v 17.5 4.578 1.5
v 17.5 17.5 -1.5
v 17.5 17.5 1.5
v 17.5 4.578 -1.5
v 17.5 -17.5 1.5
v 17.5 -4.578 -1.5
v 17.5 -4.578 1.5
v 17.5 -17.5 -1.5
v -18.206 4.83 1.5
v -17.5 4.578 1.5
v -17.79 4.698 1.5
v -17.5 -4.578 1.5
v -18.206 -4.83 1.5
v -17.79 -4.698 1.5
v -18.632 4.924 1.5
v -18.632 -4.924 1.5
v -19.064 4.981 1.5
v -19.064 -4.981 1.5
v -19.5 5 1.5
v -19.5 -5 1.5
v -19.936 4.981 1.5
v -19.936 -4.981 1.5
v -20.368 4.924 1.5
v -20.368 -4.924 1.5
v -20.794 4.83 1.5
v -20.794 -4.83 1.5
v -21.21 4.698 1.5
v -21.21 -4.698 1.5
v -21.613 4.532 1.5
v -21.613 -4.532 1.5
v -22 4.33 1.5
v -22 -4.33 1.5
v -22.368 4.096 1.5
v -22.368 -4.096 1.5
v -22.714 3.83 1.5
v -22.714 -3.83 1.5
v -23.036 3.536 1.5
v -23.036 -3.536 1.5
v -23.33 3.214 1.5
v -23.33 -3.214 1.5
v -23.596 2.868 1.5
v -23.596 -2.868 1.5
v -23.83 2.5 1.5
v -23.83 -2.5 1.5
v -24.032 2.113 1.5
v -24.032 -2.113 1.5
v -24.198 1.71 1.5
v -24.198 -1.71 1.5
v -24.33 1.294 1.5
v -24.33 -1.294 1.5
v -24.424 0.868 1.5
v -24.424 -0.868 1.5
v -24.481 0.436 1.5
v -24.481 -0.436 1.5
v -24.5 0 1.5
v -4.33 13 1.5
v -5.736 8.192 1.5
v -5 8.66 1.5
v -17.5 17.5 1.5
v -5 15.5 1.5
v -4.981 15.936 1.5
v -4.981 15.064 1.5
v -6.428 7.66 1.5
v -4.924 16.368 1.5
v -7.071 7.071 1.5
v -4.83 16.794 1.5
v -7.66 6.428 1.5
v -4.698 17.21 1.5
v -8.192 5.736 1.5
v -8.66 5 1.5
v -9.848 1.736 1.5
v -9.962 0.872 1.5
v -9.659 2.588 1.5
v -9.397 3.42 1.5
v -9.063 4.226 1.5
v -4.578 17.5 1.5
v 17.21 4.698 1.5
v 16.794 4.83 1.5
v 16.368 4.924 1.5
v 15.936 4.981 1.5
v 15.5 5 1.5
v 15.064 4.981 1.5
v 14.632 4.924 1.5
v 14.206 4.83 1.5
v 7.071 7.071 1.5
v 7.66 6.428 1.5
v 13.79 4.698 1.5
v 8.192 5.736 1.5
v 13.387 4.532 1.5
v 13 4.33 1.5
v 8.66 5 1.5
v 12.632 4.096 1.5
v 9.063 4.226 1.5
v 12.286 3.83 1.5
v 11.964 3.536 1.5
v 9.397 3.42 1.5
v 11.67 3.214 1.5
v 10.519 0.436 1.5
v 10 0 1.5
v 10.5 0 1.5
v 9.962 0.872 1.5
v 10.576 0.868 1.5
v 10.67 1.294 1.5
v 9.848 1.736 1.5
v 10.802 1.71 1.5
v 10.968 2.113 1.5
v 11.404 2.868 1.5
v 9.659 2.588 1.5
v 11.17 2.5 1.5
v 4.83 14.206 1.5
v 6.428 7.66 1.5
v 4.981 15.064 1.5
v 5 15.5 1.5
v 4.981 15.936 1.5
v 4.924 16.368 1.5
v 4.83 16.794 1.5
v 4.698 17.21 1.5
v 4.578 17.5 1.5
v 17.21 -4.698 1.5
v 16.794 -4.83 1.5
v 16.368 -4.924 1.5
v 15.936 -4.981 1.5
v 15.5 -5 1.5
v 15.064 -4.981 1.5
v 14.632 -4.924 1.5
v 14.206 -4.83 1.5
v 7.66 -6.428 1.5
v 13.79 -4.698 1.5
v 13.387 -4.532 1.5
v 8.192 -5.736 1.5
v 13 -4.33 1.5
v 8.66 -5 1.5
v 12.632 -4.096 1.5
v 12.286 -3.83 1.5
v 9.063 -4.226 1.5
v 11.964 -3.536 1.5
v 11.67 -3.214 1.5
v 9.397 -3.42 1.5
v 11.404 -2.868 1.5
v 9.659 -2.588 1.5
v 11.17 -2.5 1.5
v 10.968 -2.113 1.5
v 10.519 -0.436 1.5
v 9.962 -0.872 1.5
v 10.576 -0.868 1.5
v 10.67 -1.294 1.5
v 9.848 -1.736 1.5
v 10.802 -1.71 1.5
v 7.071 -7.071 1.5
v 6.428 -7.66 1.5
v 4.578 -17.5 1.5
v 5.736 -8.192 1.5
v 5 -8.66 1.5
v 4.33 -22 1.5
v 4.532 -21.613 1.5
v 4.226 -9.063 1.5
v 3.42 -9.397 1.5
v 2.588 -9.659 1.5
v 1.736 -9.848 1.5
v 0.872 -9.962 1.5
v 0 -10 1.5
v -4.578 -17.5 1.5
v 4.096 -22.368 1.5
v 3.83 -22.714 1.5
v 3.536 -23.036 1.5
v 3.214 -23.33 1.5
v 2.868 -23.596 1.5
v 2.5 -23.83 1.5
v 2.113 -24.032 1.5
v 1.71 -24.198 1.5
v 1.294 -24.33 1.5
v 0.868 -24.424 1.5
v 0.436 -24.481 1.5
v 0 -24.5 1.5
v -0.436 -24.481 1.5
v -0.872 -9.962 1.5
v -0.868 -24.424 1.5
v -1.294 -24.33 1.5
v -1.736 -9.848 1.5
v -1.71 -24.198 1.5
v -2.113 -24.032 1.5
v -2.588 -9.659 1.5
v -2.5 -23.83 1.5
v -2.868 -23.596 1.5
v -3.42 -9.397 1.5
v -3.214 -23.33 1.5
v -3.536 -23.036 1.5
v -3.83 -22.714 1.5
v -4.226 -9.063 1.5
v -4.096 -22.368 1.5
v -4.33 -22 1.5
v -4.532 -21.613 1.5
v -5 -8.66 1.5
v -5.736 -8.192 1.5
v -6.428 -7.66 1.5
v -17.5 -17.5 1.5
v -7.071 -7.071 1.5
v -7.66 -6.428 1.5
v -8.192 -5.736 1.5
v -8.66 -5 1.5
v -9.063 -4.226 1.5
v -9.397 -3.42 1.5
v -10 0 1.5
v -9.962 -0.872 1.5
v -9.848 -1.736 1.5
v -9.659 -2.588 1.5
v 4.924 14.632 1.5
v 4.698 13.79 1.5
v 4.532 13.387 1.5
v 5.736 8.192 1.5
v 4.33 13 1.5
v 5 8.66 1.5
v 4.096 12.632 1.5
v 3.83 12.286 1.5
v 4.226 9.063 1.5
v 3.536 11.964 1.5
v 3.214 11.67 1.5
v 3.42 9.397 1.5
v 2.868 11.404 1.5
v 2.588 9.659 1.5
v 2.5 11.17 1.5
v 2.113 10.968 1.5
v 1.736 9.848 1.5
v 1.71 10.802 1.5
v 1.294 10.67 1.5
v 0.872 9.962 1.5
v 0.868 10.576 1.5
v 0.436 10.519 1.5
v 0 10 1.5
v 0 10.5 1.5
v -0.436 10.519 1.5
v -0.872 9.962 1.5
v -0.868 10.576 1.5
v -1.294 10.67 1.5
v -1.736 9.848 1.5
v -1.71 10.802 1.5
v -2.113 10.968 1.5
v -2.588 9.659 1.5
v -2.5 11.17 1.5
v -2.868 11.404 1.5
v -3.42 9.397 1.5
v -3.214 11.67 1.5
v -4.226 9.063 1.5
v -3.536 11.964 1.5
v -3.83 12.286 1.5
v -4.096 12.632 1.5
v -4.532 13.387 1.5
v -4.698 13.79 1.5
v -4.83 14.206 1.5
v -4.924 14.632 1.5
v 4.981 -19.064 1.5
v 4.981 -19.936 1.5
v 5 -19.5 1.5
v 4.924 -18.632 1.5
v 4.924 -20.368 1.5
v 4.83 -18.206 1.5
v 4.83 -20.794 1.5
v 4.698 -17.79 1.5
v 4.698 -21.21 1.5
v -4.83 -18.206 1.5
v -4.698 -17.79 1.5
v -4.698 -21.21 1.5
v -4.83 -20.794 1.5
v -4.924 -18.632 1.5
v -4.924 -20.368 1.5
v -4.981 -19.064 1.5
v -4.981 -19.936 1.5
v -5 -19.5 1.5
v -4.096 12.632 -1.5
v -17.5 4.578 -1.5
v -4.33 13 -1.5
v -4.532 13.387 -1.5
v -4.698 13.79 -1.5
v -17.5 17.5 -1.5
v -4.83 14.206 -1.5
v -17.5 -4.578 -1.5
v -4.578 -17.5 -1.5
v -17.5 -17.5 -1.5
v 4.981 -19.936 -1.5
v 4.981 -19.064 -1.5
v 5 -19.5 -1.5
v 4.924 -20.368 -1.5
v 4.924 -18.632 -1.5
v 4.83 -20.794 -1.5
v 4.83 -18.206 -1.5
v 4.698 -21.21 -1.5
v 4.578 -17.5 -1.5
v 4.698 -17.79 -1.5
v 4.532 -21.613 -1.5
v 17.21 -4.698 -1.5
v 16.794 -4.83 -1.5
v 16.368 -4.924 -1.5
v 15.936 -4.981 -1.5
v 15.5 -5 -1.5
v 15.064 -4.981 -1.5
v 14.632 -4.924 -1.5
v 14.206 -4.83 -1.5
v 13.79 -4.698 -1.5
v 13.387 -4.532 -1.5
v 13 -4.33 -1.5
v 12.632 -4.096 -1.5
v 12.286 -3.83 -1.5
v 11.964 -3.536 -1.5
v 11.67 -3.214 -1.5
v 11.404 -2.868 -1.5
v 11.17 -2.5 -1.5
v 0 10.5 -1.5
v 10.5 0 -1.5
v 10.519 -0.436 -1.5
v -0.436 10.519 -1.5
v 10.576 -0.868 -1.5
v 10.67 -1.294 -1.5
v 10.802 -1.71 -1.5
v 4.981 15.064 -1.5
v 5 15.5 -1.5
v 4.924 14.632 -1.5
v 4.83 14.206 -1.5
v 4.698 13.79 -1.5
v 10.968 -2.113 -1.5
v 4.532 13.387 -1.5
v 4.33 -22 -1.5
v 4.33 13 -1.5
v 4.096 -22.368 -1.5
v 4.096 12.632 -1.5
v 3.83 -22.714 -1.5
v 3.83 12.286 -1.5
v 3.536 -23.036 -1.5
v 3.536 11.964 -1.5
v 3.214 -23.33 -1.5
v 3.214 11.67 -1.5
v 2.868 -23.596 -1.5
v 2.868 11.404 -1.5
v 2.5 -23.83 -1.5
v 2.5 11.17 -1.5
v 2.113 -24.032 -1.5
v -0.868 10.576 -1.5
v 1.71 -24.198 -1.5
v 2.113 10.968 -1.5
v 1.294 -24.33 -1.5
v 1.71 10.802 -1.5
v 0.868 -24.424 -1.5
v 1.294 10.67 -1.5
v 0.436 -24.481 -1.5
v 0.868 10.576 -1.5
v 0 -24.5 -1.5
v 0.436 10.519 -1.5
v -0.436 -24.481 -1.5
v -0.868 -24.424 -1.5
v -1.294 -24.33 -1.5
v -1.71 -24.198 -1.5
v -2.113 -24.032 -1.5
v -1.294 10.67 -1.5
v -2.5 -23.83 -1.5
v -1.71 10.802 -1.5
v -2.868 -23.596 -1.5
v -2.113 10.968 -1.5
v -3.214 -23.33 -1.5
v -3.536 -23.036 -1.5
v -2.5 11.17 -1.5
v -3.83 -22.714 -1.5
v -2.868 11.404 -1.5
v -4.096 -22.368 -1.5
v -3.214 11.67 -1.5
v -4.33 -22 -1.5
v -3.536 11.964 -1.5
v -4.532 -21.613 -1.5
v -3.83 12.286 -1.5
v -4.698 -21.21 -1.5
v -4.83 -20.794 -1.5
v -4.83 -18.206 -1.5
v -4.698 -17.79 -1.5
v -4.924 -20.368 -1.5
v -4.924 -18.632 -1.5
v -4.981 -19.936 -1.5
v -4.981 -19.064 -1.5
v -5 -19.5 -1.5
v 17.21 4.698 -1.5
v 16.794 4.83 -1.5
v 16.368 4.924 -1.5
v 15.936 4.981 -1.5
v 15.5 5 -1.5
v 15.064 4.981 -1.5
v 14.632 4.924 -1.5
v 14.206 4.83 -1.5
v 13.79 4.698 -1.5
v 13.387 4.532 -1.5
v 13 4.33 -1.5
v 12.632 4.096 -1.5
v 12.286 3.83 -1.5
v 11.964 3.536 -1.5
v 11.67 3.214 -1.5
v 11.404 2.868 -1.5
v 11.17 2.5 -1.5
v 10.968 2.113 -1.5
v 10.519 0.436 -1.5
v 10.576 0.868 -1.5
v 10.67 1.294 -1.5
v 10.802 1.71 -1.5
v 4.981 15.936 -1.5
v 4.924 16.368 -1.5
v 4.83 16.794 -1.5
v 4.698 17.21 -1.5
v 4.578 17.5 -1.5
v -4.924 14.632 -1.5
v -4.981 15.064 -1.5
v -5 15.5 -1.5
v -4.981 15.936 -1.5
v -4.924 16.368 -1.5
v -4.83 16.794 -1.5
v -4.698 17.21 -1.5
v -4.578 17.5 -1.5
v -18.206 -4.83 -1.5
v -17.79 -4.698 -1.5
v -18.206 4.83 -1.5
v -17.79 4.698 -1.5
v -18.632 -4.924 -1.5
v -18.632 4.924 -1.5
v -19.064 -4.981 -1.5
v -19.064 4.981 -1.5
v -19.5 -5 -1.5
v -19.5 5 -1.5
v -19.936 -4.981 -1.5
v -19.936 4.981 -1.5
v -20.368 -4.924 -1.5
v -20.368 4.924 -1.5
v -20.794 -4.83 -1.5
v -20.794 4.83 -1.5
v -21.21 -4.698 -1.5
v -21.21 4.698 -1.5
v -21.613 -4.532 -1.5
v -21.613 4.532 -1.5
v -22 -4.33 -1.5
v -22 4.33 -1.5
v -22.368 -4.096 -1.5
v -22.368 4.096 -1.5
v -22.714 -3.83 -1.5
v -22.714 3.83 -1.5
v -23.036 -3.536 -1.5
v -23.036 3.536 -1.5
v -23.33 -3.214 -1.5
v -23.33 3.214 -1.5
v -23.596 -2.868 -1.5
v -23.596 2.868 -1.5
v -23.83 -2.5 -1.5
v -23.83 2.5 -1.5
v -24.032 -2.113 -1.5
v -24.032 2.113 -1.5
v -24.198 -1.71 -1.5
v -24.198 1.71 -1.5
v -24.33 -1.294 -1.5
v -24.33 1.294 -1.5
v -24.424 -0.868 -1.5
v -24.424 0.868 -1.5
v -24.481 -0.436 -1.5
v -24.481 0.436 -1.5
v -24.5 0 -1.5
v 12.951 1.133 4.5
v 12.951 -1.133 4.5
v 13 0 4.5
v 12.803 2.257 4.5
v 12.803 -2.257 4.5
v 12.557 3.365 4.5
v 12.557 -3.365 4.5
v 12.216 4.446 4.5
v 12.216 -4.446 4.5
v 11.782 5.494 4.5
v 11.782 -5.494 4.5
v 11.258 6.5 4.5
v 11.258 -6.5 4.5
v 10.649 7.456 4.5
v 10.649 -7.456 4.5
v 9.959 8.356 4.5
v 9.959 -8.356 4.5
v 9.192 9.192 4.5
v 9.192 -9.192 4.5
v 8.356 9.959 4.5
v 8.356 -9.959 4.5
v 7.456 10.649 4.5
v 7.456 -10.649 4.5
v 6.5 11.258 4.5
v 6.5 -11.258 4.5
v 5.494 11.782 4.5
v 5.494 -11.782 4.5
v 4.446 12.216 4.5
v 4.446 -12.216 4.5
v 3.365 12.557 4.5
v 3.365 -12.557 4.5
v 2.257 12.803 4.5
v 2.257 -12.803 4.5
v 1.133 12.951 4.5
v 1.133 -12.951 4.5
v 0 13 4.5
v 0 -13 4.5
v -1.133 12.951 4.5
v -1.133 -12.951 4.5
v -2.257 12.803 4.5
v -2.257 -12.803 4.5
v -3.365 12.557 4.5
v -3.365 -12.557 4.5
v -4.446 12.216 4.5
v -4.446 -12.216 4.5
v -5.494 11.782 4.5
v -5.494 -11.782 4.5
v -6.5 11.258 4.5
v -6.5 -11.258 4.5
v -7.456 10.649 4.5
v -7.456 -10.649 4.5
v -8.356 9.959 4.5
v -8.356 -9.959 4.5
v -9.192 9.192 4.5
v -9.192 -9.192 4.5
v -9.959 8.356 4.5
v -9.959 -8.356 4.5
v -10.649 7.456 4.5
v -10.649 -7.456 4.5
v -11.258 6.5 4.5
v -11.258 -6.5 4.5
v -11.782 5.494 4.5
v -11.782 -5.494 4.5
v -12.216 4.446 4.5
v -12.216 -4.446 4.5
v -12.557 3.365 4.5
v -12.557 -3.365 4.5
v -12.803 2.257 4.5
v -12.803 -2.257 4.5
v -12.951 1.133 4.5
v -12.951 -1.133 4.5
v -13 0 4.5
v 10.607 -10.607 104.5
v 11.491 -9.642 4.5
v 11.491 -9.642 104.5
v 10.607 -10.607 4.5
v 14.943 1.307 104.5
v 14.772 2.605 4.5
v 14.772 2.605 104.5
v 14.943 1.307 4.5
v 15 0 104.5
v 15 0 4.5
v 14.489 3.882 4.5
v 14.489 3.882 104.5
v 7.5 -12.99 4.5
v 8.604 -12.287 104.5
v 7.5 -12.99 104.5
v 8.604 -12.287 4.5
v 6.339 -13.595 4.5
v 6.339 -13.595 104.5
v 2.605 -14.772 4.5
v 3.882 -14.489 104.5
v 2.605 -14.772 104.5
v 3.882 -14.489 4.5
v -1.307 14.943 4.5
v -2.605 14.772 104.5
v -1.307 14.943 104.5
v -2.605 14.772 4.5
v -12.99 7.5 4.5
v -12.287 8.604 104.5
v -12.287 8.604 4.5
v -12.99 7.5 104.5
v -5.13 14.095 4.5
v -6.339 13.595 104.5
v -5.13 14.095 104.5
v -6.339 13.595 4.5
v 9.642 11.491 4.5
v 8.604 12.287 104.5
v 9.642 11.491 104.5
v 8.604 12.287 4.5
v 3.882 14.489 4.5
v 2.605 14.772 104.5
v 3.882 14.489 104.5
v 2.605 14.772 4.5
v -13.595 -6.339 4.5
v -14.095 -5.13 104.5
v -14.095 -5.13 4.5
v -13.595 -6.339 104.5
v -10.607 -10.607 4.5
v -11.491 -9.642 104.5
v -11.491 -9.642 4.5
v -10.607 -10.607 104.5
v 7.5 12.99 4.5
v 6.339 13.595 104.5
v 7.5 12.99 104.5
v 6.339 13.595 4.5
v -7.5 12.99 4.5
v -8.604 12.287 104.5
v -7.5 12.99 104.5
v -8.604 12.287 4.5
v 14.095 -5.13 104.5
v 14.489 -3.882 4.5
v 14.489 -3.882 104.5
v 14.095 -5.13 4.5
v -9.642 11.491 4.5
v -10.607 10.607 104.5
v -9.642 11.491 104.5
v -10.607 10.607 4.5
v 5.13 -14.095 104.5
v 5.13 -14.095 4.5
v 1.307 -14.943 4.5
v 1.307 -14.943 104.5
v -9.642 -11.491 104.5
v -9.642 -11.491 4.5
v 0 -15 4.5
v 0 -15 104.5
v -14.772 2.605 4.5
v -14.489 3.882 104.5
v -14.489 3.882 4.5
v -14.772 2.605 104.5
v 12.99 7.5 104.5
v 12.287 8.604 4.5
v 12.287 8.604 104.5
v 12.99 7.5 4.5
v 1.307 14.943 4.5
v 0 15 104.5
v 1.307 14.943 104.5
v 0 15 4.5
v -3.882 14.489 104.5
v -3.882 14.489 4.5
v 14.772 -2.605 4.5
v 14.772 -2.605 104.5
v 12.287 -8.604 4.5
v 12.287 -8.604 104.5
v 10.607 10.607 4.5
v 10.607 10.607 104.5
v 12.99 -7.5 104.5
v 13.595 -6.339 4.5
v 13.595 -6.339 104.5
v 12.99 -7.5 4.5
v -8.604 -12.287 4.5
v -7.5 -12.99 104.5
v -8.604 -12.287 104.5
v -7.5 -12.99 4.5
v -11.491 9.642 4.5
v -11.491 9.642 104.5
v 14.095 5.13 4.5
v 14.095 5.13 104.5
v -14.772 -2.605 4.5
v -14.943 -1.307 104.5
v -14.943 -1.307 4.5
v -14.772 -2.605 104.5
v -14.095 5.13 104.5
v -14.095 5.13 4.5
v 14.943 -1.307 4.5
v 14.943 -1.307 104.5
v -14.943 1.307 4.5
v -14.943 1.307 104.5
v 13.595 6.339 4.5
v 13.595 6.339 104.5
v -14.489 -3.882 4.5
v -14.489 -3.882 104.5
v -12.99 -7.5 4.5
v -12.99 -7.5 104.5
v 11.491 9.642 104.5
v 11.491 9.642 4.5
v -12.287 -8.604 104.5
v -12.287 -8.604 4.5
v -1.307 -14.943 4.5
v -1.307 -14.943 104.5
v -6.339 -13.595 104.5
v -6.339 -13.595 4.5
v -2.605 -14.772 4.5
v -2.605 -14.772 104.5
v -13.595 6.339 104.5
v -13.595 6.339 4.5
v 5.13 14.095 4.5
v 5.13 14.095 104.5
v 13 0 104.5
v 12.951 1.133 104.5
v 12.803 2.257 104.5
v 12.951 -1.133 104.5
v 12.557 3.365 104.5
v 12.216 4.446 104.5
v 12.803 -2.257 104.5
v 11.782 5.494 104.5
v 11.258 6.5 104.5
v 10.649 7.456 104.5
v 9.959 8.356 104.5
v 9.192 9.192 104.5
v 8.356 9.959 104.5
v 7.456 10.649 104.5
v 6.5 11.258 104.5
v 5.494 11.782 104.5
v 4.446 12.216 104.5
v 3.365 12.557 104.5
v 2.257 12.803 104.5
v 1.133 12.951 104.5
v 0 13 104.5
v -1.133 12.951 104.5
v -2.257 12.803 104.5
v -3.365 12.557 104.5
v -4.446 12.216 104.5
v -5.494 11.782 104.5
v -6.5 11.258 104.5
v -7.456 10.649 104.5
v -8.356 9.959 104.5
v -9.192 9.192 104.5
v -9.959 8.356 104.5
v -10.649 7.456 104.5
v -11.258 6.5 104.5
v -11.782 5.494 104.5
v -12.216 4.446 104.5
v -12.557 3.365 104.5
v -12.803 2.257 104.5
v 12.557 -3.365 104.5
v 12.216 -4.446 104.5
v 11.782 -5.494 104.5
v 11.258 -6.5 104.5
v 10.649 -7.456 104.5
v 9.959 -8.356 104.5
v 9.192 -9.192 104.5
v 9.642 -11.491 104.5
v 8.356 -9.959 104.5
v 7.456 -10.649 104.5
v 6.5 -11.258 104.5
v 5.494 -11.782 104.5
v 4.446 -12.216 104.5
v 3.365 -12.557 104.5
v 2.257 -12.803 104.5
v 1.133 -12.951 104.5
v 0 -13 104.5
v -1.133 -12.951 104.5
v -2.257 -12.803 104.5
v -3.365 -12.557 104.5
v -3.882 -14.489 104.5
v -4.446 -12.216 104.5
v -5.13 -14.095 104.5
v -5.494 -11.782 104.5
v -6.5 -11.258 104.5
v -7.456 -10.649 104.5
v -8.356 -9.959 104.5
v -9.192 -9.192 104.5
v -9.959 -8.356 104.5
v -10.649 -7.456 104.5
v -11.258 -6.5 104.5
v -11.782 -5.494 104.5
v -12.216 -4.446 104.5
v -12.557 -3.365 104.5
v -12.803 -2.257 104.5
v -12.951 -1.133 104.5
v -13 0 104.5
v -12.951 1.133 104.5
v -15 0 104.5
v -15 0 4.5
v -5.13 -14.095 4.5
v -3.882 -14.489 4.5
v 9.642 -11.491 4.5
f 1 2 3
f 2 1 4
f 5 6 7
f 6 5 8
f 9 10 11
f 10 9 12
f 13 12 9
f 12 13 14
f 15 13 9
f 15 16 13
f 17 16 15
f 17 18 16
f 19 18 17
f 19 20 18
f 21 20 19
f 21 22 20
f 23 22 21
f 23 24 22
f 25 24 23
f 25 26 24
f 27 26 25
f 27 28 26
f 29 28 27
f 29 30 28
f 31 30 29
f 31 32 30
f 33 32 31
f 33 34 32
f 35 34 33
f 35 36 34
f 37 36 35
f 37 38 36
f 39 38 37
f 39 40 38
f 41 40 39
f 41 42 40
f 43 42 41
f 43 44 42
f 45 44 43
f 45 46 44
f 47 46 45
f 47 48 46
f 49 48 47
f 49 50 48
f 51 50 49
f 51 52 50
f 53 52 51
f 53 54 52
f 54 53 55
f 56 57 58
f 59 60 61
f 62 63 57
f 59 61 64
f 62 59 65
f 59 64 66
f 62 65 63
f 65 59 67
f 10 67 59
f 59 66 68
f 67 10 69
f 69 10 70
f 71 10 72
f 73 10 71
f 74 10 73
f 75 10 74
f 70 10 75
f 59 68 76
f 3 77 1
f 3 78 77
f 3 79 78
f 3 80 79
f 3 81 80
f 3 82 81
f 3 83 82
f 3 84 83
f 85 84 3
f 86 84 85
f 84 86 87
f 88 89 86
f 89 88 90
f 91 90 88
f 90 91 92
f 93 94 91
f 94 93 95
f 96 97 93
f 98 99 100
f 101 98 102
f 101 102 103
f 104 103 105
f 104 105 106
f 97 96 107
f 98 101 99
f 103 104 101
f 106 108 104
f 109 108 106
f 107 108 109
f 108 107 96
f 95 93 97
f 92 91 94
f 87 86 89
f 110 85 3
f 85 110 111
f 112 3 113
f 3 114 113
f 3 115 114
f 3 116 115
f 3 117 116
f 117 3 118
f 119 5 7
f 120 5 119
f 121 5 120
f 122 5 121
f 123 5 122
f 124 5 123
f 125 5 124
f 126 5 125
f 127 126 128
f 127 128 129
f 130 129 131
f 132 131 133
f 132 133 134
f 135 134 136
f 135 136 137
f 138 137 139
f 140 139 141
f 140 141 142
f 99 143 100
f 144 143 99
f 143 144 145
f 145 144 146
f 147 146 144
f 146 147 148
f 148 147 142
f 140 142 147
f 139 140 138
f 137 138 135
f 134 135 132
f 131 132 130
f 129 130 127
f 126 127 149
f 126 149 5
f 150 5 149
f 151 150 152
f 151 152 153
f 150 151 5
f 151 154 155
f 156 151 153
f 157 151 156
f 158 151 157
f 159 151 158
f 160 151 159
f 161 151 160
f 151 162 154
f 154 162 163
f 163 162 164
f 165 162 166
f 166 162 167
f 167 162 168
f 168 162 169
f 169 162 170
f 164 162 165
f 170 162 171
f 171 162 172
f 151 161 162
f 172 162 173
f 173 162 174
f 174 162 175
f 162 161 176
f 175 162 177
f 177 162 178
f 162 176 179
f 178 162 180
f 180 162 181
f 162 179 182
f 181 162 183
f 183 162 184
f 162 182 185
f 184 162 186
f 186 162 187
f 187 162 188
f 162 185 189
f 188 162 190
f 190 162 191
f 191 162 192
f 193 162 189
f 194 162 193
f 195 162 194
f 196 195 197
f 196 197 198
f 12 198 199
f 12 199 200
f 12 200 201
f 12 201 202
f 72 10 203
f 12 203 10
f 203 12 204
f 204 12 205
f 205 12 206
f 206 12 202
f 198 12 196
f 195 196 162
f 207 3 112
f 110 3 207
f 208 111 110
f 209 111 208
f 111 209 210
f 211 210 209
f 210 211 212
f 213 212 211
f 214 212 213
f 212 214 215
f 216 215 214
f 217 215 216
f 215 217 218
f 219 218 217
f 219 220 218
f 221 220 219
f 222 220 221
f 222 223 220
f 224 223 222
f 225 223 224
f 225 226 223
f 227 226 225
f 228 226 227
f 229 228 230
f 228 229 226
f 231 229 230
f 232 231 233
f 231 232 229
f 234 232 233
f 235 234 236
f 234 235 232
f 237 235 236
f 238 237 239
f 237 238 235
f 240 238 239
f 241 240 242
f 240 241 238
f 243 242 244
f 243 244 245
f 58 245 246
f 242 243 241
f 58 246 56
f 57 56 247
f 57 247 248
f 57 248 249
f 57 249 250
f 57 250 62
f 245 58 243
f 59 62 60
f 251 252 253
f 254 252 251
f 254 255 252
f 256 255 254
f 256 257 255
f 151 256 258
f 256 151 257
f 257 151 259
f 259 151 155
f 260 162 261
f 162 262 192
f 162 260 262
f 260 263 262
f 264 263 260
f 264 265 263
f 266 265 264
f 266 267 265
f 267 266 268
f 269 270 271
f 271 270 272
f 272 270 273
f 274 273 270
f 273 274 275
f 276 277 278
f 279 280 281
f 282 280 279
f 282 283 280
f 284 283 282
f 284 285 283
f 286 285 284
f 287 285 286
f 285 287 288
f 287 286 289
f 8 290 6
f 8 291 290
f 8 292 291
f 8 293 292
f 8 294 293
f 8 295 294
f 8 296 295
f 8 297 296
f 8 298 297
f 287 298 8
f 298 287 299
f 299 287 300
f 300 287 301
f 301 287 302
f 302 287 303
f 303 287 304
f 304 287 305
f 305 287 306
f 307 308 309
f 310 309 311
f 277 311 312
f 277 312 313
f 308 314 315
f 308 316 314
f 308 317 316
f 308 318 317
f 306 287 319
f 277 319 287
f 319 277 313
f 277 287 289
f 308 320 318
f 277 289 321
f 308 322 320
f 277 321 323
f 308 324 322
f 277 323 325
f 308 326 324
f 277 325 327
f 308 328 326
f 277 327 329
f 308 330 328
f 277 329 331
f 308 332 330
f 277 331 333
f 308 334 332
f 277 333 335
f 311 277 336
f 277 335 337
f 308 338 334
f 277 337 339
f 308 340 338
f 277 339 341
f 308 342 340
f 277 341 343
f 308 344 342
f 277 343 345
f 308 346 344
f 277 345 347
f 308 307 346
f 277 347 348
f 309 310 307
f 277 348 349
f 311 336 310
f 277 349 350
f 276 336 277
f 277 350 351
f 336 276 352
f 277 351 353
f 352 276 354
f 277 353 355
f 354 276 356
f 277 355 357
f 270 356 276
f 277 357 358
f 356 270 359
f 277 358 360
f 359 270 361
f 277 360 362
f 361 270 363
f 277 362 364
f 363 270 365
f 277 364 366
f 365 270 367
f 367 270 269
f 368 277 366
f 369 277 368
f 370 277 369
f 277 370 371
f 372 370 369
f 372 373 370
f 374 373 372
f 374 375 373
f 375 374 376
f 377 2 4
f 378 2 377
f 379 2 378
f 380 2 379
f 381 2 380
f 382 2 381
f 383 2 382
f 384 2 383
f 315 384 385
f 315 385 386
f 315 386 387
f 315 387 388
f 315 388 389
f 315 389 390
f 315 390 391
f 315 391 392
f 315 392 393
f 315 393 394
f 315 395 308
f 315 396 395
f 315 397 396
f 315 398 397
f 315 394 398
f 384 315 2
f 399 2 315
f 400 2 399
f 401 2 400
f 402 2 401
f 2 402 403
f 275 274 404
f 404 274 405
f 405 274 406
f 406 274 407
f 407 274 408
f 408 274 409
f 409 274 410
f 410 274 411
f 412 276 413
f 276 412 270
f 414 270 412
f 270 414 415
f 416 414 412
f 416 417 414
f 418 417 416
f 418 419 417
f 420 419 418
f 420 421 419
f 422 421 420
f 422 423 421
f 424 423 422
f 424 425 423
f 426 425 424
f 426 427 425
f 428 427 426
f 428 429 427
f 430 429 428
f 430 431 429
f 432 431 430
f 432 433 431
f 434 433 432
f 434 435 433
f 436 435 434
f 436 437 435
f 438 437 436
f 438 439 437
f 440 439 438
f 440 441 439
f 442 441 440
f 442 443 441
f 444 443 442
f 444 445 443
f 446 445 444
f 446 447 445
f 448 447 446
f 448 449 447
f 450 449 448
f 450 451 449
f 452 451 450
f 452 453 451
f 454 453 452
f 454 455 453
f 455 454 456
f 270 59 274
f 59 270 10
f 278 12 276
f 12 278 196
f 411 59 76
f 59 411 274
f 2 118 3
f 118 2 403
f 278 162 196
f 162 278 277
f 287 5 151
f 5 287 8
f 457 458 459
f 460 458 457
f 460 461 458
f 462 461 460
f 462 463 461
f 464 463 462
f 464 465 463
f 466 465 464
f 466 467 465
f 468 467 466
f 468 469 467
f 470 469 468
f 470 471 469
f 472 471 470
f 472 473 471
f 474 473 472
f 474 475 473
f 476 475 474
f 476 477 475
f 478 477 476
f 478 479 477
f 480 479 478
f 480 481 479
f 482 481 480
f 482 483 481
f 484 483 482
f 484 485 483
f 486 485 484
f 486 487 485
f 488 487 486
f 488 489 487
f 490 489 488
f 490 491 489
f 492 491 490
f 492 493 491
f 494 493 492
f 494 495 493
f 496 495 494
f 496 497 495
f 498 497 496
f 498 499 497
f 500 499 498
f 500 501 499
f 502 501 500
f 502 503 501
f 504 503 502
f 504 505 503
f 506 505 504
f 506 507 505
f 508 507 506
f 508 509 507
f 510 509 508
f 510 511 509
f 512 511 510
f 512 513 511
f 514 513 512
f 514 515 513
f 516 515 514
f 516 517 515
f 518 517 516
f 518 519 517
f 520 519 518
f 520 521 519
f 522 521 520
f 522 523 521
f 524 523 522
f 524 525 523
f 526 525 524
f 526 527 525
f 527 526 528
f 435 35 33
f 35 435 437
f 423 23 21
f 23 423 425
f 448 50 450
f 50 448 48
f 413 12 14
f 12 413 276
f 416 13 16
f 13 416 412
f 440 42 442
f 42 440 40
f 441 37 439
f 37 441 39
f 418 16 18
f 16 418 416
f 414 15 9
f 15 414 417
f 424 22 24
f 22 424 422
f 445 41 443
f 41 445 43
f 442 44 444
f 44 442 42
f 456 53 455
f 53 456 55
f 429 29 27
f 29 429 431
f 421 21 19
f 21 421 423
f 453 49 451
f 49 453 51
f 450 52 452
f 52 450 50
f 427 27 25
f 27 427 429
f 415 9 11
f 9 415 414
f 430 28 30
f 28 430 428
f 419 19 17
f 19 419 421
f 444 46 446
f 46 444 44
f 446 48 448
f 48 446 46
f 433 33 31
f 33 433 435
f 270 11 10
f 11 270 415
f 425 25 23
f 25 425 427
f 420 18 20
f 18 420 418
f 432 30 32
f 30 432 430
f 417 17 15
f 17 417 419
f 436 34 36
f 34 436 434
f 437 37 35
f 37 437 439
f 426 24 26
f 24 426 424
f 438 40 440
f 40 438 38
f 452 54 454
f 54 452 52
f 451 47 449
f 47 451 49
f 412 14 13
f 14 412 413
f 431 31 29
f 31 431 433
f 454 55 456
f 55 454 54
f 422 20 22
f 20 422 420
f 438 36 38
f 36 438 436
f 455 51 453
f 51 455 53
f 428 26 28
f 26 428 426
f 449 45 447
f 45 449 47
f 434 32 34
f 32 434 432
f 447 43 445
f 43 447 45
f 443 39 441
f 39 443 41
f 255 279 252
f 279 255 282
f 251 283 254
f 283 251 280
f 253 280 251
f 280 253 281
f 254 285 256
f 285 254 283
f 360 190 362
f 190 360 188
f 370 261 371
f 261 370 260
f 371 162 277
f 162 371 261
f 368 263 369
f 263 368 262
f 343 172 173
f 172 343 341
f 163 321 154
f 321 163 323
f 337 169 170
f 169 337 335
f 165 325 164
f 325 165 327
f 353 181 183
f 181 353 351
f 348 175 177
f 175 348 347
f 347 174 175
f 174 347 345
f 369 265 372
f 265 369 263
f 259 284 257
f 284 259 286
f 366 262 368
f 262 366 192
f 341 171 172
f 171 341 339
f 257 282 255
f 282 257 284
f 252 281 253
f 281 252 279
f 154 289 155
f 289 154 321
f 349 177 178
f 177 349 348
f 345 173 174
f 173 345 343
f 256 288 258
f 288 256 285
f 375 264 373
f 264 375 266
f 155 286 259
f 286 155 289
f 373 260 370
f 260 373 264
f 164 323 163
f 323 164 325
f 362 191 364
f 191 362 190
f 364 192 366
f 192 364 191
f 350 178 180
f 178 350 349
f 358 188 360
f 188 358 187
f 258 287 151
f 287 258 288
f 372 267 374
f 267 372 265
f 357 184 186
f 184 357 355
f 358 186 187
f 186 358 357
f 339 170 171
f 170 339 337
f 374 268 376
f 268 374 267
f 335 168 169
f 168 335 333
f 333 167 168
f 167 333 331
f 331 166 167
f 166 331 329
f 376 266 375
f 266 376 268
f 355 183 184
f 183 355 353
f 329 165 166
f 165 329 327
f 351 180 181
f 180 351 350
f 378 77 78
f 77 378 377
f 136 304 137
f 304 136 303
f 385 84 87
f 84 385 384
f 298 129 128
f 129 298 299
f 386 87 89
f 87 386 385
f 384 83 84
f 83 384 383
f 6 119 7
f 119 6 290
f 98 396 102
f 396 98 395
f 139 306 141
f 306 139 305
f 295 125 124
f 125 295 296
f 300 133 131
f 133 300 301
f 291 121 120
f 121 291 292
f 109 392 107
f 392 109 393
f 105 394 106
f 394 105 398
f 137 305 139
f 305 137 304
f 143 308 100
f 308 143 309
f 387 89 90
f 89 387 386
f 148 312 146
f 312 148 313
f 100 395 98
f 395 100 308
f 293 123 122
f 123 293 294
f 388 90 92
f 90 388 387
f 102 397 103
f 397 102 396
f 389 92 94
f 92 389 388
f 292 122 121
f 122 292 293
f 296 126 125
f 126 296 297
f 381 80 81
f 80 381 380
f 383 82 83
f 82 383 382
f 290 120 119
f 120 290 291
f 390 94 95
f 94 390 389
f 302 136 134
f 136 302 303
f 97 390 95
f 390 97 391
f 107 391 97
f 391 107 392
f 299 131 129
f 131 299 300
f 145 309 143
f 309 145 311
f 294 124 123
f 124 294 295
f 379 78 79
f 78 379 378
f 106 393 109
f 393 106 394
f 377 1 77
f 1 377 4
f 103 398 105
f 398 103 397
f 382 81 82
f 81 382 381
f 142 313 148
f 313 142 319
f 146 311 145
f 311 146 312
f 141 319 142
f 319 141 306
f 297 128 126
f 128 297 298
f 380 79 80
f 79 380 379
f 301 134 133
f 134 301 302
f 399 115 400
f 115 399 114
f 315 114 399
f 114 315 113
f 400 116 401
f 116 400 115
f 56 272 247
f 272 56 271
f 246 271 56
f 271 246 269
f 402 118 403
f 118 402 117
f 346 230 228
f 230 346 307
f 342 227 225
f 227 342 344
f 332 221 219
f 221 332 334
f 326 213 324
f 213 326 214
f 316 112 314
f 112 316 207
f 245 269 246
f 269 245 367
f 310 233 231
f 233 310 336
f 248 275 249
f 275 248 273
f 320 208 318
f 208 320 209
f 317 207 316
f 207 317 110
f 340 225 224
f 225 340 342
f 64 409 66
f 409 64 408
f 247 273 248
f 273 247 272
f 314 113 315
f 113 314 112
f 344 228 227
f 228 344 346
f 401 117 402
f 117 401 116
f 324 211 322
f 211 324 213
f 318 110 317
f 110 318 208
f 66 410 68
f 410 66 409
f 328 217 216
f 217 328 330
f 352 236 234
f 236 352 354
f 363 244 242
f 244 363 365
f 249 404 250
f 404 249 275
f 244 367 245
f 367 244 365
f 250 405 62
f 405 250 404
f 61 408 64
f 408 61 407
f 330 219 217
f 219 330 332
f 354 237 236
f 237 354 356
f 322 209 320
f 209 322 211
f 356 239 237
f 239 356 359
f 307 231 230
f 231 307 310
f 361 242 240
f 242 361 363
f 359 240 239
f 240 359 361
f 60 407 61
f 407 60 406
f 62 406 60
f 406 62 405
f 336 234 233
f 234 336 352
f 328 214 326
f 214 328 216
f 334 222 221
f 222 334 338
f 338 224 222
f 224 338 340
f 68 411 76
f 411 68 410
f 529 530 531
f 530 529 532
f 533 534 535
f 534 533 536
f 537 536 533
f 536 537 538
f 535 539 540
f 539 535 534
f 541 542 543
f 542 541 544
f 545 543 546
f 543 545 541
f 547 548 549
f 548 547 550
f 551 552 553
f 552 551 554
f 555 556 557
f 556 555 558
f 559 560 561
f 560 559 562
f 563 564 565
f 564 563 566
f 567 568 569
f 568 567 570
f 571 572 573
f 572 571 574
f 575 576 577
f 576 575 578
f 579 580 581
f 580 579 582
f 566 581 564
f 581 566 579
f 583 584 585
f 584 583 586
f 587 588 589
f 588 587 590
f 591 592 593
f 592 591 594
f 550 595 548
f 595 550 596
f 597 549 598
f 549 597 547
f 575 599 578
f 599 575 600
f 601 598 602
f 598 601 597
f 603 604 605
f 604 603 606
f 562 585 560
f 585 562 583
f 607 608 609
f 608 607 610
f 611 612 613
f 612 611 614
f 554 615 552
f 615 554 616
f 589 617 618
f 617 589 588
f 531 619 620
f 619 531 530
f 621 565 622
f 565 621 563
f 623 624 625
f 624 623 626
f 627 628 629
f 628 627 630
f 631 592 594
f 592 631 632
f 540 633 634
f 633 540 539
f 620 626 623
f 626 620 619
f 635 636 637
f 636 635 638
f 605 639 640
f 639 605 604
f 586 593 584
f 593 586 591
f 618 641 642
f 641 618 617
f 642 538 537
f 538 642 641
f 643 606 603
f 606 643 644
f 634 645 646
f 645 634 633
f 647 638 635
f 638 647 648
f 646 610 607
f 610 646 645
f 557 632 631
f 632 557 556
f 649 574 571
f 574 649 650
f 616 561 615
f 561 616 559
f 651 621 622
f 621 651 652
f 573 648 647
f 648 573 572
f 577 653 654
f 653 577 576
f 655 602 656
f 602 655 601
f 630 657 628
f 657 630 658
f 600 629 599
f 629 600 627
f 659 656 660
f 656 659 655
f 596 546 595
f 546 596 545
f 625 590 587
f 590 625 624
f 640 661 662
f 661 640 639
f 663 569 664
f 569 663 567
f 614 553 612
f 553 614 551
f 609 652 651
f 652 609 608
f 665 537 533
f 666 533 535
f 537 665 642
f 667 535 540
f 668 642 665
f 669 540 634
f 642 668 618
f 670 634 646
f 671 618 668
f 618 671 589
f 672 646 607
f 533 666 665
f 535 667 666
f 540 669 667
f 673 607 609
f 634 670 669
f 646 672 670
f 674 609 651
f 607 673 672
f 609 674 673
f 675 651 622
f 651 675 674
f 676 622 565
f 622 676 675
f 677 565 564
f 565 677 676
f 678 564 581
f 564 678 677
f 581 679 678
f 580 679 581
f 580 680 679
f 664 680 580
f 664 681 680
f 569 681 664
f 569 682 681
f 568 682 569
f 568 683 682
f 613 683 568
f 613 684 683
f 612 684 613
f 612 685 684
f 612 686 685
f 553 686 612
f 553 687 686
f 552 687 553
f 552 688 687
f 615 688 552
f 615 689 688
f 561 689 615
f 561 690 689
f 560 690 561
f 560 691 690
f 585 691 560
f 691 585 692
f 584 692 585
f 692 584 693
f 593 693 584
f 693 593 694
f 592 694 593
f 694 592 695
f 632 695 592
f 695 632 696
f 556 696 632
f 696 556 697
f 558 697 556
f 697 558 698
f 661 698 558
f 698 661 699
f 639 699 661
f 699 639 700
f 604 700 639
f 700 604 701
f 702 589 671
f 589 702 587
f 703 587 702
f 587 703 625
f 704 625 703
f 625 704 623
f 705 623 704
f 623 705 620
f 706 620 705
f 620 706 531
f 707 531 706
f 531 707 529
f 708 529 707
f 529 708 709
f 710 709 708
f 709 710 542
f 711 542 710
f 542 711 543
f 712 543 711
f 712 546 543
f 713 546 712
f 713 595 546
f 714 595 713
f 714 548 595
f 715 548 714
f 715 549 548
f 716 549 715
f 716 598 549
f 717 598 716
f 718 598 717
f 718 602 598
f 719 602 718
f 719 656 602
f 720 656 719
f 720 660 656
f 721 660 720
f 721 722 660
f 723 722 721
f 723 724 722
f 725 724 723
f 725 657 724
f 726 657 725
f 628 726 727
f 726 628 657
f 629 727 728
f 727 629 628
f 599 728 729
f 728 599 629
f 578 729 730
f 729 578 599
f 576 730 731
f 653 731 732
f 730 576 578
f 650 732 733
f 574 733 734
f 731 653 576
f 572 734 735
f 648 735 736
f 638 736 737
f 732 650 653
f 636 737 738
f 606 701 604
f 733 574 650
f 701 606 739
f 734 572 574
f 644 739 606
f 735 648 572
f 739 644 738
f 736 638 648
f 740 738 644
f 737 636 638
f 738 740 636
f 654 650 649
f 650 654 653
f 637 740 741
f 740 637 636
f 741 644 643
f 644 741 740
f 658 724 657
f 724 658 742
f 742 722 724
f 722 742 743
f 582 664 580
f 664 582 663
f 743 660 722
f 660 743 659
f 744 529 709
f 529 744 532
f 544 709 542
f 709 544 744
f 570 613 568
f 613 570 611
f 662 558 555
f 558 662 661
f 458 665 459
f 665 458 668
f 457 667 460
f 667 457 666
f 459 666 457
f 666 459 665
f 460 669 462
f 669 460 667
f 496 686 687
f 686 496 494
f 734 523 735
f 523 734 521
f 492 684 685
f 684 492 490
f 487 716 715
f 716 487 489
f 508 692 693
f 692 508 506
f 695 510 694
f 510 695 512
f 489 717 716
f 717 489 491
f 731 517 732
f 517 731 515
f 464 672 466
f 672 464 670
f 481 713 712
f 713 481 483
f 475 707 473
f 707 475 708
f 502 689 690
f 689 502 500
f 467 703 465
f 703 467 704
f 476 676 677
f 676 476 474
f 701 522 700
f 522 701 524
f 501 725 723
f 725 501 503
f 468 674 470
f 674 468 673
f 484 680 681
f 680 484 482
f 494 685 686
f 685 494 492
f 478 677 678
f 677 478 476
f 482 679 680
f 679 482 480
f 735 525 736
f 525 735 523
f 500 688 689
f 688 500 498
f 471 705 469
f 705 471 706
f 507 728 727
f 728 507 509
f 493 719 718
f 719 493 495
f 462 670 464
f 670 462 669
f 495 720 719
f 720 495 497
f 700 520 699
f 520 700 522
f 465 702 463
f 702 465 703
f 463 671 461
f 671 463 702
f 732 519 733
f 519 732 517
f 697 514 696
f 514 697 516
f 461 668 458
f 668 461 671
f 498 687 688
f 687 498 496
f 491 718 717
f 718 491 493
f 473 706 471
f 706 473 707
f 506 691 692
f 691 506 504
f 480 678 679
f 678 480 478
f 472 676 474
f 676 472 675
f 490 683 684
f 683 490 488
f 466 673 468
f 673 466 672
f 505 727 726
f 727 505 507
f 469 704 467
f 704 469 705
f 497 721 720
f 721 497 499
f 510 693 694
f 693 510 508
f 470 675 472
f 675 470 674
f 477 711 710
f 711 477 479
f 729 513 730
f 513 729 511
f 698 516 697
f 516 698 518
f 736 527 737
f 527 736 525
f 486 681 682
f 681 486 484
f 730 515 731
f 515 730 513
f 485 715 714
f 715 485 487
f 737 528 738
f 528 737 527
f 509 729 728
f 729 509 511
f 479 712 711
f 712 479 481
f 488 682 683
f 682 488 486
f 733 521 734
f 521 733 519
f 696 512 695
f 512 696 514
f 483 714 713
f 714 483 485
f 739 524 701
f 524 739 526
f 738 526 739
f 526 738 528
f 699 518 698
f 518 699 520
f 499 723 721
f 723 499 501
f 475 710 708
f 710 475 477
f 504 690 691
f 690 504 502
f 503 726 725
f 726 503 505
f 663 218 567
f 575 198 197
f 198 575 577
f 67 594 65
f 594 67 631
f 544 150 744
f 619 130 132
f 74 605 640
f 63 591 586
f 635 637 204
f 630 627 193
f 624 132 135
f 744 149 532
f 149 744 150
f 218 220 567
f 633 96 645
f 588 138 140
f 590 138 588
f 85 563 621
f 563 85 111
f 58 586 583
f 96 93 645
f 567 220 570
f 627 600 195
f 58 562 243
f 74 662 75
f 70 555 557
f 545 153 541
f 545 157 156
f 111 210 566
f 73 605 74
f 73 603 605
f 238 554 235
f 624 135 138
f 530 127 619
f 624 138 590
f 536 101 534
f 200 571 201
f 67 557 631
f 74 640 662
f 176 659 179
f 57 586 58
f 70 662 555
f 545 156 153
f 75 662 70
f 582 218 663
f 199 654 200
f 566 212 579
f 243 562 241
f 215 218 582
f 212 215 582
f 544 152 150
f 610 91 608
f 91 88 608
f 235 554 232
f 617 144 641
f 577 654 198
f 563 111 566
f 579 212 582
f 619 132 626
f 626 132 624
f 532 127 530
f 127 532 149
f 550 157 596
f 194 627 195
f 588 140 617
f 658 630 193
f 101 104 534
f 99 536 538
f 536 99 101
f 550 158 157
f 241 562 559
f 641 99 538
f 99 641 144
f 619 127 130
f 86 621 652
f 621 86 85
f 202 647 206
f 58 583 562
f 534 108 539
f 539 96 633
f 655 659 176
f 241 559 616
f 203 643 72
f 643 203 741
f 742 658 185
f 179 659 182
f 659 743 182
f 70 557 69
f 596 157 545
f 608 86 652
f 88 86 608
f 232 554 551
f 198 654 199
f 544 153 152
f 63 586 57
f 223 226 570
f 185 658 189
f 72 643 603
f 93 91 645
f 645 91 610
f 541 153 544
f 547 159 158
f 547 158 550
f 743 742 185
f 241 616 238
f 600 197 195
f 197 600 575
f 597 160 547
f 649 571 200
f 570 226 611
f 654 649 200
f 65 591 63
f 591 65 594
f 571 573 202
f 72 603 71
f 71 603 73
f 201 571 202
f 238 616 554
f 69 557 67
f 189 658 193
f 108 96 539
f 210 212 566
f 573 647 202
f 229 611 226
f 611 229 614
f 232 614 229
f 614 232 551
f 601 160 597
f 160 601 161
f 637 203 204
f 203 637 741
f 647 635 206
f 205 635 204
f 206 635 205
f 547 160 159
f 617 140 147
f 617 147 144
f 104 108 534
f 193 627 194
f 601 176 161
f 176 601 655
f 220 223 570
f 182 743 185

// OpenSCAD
// file: base.scad
//$fa=5; $fs=0.1;

// стыкабельное основание
module base(){
	difference(){
		union(){
			cube([35,35,3], center=true);	 // база
			translate([0, 0, 3]) cylinder(h=3, r=10, center=true);
			translate([-19.5, 0, 0]) cylinder(h=3, r=5, center=true); // выступы
			translate([0, -19.5, 0]) cylinder(h=3, r=5, center=true);
		}

		union(){
			translate([15.5, 0, 0]) cylinder(h=3.2, r=5, center=true); // прорези
			translate([0, 15.5, 0]) cylinder(h=3.2, r=5, center=true);
		}
	}
}

base();
// main file
$fa=5; $fs=0.1;

use <base.scad>;

module bigcyl1(){
	base();

	translate([0,0,54.5]) difference(){cylinder(r=15, h=100, center=true); cylinder(r=13, h=100, center=true);}
	translate([0,0,3]) cylinder(r1=10, r2=15, h=3, center=true);
}

bigcyl1();
